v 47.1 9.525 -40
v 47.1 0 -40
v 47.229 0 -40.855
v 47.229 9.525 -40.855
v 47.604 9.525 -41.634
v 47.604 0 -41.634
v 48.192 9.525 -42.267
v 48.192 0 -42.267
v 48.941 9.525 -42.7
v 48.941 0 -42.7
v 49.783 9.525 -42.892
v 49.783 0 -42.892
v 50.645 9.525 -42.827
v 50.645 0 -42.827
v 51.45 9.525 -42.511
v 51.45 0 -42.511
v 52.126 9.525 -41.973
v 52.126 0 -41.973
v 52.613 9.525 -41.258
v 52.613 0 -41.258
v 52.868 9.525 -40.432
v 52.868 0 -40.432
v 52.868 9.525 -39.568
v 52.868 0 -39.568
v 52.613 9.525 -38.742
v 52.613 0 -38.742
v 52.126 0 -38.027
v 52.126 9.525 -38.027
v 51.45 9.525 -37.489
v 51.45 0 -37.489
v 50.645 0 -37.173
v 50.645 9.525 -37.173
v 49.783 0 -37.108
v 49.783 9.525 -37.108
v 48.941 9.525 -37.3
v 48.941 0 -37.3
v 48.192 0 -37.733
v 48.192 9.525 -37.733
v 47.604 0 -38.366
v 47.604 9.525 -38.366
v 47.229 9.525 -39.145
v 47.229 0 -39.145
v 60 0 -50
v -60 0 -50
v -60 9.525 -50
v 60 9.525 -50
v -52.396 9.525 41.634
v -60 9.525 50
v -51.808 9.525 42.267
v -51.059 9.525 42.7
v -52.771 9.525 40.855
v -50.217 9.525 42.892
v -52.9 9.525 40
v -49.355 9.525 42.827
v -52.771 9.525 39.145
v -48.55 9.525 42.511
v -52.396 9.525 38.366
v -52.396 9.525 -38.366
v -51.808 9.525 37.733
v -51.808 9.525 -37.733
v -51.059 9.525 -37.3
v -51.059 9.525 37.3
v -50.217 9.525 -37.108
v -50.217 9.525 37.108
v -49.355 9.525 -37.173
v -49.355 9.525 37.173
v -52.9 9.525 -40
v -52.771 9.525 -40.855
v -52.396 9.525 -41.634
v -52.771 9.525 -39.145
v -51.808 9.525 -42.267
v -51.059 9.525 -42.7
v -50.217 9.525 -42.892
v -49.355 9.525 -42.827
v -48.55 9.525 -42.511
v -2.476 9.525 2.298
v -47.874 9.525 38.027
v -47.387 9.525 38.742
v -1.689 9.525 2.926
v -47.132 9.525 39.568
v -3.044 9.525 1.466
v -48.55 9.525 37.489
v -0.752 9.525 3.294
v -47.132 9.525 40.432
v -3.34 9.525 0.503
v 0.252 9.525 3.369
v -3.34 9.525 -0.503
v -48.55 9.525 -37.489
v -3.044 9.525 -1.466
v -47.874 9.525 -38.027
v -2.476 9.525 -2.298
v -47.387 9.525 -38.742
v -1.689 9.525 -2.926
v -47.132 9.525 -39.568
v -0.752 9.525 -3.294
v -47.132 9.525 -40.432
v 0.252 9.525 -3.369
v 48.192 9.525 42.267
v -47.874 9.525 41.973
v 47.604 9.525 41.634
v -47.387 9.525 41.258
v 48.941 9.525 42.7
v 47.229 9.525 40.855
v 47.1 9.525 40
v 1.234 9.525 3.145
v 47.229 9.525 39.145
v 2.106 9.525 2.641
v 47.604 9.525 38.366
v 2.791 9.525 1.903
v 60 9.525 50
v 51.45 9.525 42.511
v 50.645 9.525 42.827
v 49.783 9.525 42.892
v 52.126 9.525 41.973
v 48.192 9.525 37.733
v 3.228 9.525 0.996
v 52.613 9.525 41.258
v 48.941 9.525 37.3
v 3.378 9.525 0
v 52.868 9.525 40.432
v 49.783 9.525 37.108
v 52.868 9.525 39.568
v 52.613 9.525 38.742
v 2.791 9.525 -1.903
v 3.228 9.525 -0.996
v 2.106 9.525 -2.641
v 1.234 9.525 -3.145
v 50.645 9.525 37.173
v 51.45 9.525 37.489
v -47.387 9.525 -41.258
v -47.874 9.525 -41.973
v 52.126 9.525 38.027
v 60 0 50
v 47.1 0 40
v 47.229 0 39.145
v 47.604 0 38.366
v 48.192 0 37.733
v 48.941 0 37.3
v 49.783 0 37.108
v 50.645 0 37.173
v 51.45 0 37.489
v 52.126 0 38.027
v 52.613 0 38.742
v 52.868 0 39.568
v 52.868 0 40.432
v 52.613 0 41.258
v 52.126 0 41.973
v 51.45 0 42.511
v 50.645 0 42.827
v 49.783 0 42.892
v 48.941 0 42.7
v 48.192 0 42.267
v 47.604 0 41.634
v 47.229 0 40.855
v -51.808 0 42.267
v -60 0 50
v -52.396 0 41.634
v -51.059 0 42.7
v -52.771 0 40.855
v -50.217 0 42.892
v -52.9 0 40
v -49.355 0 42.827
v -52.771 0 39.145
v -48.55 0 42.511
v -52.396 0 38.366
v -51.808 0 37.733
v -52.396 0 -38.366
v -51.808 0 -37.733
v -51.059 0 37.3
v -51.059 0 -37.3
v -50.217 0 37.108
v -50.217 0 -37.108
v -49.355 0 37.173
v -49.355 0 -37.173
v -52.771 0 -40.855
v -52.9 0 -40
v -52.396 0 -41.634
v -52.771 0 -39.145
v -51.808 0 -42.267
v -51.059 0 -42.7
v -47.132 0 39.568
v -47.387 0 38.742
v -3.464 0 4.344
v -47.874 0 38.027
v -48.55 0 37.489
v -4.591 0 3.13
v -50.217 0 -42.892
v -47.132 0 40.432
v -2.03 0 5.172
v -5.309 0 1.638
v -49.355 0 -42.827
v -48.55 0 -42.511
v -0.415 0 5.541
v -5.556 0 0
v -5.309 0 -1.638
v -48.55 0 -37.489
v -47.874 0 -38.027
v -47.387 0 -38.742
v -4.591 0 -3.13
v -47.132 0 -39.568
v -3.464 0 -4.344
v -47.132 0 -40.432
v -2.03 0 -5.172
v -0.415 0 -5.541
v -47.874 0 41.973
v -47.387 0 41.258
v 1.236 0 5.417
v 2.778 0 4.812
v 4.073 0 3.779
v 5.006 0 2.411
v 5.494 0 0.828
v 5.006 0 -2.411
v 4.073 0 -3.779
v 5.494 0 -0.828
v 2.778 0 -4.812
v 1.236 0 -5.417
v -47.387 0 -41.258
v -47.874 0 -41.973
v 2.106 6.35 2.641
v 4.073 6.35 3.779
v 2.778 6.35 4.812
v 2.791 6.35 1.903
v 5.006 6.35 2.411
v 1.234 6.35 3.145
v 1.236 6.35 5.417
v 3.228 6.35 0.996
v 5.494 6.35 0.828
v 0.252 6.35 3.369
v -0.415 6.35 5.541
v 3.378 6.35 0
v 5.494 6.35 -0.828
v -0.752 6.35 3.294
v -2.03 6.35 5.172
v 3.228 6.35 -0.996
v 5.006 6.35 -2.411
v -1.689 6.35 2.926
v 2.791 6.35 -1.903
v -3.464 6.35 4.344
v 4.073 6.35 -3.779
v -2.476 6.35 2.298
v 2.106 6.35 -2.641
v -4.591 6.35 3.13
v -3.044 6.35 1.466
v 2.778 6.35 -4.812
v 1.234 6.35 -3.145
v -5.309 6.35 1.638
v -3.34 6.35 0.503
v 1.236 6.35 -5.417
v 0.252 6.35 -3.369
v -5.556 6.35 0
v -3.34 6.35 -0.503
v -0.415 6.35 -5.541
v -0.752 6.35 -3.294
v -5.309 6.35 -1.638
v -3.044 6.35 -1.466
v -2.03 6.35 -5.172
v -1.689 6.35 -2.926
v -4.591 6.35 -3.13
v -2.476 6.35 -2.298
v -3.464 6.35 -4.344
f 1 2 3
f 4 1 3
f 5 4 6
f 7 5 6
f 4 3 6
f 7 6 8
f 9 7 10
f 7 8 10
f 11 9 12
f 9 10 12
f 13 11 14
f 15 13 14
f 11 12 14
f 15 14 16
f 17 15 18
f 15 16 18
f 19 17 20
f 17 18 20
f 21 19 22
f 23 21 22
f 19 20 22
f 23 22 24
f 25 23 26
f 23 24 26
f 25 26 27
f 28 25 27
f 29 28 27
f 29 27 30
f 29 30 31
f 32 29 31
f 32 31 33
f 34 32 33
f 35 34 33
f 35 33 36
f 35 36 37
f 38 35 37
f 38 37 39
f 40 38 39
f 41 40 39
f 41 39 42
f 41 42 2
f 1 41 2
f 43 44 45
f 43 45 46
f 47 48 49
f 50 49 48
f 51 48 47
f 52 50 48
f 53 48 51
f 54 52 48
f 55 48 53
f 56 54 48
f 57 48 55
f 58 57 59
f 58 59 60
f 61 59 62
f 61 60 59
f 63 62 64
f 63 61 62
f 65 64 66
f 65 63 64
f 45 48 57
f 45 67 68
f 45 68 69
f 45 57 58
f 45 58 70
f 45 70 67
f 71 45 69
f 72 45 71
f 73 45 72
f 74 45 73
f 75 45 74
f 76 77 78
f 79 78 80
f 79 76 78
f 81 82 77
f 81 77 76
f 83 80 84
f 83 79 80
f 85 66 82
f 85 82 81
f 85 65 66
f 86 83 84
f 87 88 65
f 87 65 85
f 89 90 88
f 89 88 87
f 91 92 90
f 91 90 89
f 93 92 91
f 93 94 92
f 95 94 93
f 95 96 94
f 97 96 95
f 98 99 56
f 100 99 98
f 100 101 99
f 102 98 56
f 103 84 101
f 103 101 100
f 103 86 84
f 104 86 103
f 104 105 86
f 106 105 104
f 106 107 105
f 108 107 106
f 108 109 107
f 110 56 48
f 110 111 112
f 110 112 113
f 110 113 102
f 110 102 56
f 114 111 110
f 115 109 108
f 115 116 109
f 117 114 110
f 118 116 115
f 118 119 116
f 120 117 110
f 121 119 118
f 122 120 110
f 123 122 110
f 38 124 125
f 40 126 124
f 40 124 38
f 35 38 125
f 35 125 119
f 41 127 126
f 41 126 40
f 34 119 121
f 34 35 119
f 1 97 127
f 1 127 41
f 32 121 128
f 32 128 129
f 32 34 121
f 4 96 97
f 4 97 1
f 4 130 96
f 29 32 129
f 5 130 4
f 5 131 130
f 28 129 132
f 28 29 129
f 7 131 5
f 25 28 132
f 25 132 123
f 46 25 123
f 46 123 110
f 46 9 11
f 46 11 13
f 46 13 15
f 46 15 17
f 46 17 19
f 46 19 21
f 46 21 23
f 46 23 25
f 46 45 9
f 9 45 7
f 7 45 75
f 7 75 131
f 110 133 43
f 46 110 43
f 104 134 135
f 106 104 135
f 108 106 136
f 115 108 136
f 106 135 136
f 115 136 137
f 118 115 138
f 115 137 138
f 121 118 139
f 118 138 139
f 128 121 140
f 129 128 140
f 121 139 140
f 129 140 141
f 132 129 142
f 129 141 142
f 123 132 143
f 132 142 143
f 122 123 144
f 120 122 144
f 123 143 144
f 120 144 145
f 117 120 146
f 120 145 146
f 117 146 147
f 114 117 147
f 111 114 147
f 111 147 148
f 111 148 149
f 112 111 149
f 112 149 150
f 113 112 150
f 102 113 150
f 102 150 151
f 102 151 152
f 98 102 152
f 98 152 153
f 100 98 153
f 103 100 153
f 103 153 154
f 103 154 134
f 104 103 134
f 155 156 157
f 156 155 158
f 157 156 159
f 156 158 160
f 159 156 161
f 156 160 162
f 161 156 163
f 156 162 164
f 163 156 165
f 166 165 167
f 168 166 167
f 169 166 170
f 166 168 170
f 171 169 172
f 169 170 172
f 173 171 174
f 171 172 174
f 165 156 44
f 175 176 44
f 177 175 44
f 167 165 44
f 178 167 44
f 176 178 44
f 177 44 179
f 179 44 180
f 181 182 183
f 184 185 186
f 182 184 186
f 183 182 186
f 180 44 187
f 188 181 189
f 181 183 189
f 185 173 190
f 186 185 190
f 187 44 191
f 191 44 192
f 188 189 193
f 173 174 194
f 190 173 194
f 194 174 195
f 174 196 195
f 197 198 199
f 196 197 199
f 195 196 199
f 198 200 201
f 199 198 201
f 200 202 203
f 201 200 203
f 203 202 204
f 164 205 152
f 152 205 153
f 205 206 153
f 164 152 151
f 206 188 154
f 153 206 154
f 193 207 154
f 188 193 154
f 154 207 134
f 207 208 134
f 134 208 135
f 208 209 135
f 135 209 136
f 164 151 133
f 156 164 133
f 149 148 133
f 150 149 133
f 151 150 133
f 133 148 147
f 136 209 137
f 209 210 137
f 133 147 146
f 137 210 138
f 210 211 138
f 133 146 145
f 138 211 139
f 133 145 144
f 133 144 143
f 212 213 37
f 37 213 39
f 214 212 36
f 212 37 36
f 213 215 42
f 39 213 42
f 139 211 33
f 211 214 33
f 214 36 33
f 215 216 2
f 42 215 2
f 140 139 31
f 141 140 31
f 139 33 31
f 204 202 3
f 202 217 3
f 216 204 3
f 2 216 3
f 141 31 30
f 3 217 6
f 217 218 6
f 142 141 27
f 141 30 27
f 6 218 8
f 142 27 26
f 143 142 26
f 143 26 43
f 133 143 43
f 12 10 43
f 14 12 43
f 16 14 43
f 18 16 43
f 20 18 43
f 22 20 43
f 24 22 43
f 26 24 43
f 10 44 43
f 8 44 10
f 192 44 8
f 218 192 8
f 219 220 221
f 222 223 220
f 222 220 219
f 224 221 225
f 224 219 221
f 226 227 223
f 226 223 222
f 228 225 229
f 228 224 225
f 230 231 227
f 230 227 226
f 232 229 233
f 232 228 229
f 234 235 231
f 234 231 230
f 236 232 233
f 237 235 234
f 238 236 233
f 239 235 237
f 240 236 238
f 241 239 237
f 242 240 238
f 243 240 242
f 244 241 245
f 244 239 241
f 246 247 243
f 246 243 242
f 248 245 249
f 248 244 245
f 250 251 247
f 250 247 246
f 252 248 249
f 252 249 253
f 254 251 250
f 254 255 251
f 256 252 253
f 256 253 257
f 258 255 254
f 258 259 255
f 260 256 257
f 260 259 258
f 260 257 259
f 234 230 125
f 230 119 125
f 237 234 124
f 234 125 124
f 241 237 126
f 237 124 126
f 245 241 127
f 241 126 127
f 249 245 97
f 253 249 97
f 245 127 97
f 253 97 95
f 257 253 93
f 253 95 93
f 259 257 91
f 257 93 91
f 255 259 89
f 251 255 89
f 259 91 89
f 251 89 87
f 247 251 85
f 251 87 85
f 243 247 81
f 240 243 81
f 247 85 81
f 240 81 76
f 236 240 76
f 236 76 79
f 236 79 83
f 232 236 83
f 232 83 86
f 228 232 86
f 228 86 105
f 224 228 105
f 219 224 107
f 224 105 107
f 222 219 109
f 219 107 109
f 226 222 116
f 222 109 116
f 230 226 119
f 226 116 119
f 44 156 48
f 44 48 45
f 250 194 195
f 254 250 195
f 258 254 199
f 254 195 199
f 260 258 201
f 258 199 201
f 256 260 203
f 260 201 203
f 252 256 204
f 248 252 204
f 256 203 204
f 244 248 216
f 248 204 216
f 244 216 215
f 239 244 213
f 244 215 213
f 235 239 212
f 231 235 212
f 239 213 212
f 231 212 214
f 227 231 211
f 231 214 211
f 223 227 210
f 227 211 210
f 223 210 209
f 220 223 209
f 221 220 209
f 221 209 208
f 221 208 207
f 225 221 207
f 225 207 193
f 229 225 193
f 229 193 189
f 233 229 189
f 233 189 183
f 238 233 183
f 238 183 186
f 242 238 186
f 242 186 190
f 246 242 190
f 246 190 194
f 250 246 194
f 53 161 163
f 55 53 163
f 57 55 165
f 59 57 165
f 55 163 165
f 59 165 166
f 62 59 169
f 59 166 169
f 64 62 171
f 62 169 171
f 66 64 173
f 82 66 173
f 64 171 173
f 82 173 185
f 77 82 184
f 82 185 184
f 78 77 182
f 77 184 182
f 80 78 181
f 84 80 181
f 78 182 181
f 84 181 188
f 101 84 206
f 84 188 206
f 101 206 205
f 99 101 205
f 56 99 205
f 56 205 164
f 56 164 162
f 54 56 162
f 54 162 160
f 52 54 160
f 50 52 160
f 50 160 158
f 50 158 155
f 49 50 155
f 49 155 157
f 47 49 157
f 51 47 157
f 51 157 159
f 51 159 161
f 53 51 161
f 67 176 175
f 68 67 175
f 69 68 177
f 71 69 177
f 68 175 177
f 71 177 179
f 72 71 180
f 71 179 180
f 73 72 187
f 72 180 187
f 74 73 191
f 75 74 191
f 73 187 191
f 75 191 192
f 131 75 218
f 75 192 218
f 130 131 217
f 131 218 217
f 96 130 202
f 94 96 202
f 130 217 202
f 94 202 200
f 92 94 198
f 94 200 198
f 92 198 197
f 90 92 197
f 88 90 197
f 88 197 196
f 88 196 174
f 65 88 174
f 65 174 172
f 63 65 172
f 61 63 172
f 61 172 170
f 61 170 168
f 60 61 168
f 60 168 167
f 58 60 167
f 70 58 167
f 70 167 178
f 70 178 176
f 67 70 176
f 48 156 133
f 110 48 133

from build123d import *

# Parameters (mm, degrees)
SKETCH1_W                                        = 120
SKETCH1_H                                        = 100
BOSS_EXTRUDE1_DEPTH                              = 9.525
M5_CLEARANCE_HOLE1_D                             = 5.8
CBORE_FOR_1_4_SOCKET_HEAD_CAP_SCREW1_D           = 6.7564
CBORE_FOR_1_4_SOCKET_HEAD_CAP_SCREW1_CBORE_D     = 11.1125
CBORE_FOR_1_4_SOCKET_HEAD_CAP_SCREW1_CBORE_DEPTH = 6.35


with BuildPart() as part:
    # Sketch1 → Boss-Extrude1 (new body)
    with BuildSketch(Plane(origin=(0, 0, 0), x_dir=(1, 0, 0), z_dir=(0, 1, 0))):
        Rectangle(SKETCH1_W, SKETCH1_H)
    extrude(amount=BOSS_EXTRUDE1_DEPTH)

    # M5 Clearance Hole1 (through all)
    with Locations(Plane(origin=(0, 9.525, 0), x_dir=(1, 0, 0), z_dir=(0, 1, 0))):
        with Locations((-50, -40), (-50, 40), (50, 40), (50, -40)):
            Hole(M5_CLEARANCE_HOLE1_D / 2)

    # CBORE for 1/4 Socket Head Cap Screw1 (through all)
    with Locations(Plane(origin=(0, 0, 0), x_dir=(-1, 0, 0), z_dir=(0, -1, 0))):
        with Locations((0, 0)):
            CounterBoreHole(CBORE_FOR_1_4_SOCKET_HEAD_CAP_SCREW1_D / 2, CBORE_FOR_1_4_SOCKET_HEAD_CAP_SCREW1_CBORE_D / 2, CBORE_FOR_1_4_SOCKET_HEAD_CAP_SCREW1_CBORE_DEPTH)


solid = part.part
